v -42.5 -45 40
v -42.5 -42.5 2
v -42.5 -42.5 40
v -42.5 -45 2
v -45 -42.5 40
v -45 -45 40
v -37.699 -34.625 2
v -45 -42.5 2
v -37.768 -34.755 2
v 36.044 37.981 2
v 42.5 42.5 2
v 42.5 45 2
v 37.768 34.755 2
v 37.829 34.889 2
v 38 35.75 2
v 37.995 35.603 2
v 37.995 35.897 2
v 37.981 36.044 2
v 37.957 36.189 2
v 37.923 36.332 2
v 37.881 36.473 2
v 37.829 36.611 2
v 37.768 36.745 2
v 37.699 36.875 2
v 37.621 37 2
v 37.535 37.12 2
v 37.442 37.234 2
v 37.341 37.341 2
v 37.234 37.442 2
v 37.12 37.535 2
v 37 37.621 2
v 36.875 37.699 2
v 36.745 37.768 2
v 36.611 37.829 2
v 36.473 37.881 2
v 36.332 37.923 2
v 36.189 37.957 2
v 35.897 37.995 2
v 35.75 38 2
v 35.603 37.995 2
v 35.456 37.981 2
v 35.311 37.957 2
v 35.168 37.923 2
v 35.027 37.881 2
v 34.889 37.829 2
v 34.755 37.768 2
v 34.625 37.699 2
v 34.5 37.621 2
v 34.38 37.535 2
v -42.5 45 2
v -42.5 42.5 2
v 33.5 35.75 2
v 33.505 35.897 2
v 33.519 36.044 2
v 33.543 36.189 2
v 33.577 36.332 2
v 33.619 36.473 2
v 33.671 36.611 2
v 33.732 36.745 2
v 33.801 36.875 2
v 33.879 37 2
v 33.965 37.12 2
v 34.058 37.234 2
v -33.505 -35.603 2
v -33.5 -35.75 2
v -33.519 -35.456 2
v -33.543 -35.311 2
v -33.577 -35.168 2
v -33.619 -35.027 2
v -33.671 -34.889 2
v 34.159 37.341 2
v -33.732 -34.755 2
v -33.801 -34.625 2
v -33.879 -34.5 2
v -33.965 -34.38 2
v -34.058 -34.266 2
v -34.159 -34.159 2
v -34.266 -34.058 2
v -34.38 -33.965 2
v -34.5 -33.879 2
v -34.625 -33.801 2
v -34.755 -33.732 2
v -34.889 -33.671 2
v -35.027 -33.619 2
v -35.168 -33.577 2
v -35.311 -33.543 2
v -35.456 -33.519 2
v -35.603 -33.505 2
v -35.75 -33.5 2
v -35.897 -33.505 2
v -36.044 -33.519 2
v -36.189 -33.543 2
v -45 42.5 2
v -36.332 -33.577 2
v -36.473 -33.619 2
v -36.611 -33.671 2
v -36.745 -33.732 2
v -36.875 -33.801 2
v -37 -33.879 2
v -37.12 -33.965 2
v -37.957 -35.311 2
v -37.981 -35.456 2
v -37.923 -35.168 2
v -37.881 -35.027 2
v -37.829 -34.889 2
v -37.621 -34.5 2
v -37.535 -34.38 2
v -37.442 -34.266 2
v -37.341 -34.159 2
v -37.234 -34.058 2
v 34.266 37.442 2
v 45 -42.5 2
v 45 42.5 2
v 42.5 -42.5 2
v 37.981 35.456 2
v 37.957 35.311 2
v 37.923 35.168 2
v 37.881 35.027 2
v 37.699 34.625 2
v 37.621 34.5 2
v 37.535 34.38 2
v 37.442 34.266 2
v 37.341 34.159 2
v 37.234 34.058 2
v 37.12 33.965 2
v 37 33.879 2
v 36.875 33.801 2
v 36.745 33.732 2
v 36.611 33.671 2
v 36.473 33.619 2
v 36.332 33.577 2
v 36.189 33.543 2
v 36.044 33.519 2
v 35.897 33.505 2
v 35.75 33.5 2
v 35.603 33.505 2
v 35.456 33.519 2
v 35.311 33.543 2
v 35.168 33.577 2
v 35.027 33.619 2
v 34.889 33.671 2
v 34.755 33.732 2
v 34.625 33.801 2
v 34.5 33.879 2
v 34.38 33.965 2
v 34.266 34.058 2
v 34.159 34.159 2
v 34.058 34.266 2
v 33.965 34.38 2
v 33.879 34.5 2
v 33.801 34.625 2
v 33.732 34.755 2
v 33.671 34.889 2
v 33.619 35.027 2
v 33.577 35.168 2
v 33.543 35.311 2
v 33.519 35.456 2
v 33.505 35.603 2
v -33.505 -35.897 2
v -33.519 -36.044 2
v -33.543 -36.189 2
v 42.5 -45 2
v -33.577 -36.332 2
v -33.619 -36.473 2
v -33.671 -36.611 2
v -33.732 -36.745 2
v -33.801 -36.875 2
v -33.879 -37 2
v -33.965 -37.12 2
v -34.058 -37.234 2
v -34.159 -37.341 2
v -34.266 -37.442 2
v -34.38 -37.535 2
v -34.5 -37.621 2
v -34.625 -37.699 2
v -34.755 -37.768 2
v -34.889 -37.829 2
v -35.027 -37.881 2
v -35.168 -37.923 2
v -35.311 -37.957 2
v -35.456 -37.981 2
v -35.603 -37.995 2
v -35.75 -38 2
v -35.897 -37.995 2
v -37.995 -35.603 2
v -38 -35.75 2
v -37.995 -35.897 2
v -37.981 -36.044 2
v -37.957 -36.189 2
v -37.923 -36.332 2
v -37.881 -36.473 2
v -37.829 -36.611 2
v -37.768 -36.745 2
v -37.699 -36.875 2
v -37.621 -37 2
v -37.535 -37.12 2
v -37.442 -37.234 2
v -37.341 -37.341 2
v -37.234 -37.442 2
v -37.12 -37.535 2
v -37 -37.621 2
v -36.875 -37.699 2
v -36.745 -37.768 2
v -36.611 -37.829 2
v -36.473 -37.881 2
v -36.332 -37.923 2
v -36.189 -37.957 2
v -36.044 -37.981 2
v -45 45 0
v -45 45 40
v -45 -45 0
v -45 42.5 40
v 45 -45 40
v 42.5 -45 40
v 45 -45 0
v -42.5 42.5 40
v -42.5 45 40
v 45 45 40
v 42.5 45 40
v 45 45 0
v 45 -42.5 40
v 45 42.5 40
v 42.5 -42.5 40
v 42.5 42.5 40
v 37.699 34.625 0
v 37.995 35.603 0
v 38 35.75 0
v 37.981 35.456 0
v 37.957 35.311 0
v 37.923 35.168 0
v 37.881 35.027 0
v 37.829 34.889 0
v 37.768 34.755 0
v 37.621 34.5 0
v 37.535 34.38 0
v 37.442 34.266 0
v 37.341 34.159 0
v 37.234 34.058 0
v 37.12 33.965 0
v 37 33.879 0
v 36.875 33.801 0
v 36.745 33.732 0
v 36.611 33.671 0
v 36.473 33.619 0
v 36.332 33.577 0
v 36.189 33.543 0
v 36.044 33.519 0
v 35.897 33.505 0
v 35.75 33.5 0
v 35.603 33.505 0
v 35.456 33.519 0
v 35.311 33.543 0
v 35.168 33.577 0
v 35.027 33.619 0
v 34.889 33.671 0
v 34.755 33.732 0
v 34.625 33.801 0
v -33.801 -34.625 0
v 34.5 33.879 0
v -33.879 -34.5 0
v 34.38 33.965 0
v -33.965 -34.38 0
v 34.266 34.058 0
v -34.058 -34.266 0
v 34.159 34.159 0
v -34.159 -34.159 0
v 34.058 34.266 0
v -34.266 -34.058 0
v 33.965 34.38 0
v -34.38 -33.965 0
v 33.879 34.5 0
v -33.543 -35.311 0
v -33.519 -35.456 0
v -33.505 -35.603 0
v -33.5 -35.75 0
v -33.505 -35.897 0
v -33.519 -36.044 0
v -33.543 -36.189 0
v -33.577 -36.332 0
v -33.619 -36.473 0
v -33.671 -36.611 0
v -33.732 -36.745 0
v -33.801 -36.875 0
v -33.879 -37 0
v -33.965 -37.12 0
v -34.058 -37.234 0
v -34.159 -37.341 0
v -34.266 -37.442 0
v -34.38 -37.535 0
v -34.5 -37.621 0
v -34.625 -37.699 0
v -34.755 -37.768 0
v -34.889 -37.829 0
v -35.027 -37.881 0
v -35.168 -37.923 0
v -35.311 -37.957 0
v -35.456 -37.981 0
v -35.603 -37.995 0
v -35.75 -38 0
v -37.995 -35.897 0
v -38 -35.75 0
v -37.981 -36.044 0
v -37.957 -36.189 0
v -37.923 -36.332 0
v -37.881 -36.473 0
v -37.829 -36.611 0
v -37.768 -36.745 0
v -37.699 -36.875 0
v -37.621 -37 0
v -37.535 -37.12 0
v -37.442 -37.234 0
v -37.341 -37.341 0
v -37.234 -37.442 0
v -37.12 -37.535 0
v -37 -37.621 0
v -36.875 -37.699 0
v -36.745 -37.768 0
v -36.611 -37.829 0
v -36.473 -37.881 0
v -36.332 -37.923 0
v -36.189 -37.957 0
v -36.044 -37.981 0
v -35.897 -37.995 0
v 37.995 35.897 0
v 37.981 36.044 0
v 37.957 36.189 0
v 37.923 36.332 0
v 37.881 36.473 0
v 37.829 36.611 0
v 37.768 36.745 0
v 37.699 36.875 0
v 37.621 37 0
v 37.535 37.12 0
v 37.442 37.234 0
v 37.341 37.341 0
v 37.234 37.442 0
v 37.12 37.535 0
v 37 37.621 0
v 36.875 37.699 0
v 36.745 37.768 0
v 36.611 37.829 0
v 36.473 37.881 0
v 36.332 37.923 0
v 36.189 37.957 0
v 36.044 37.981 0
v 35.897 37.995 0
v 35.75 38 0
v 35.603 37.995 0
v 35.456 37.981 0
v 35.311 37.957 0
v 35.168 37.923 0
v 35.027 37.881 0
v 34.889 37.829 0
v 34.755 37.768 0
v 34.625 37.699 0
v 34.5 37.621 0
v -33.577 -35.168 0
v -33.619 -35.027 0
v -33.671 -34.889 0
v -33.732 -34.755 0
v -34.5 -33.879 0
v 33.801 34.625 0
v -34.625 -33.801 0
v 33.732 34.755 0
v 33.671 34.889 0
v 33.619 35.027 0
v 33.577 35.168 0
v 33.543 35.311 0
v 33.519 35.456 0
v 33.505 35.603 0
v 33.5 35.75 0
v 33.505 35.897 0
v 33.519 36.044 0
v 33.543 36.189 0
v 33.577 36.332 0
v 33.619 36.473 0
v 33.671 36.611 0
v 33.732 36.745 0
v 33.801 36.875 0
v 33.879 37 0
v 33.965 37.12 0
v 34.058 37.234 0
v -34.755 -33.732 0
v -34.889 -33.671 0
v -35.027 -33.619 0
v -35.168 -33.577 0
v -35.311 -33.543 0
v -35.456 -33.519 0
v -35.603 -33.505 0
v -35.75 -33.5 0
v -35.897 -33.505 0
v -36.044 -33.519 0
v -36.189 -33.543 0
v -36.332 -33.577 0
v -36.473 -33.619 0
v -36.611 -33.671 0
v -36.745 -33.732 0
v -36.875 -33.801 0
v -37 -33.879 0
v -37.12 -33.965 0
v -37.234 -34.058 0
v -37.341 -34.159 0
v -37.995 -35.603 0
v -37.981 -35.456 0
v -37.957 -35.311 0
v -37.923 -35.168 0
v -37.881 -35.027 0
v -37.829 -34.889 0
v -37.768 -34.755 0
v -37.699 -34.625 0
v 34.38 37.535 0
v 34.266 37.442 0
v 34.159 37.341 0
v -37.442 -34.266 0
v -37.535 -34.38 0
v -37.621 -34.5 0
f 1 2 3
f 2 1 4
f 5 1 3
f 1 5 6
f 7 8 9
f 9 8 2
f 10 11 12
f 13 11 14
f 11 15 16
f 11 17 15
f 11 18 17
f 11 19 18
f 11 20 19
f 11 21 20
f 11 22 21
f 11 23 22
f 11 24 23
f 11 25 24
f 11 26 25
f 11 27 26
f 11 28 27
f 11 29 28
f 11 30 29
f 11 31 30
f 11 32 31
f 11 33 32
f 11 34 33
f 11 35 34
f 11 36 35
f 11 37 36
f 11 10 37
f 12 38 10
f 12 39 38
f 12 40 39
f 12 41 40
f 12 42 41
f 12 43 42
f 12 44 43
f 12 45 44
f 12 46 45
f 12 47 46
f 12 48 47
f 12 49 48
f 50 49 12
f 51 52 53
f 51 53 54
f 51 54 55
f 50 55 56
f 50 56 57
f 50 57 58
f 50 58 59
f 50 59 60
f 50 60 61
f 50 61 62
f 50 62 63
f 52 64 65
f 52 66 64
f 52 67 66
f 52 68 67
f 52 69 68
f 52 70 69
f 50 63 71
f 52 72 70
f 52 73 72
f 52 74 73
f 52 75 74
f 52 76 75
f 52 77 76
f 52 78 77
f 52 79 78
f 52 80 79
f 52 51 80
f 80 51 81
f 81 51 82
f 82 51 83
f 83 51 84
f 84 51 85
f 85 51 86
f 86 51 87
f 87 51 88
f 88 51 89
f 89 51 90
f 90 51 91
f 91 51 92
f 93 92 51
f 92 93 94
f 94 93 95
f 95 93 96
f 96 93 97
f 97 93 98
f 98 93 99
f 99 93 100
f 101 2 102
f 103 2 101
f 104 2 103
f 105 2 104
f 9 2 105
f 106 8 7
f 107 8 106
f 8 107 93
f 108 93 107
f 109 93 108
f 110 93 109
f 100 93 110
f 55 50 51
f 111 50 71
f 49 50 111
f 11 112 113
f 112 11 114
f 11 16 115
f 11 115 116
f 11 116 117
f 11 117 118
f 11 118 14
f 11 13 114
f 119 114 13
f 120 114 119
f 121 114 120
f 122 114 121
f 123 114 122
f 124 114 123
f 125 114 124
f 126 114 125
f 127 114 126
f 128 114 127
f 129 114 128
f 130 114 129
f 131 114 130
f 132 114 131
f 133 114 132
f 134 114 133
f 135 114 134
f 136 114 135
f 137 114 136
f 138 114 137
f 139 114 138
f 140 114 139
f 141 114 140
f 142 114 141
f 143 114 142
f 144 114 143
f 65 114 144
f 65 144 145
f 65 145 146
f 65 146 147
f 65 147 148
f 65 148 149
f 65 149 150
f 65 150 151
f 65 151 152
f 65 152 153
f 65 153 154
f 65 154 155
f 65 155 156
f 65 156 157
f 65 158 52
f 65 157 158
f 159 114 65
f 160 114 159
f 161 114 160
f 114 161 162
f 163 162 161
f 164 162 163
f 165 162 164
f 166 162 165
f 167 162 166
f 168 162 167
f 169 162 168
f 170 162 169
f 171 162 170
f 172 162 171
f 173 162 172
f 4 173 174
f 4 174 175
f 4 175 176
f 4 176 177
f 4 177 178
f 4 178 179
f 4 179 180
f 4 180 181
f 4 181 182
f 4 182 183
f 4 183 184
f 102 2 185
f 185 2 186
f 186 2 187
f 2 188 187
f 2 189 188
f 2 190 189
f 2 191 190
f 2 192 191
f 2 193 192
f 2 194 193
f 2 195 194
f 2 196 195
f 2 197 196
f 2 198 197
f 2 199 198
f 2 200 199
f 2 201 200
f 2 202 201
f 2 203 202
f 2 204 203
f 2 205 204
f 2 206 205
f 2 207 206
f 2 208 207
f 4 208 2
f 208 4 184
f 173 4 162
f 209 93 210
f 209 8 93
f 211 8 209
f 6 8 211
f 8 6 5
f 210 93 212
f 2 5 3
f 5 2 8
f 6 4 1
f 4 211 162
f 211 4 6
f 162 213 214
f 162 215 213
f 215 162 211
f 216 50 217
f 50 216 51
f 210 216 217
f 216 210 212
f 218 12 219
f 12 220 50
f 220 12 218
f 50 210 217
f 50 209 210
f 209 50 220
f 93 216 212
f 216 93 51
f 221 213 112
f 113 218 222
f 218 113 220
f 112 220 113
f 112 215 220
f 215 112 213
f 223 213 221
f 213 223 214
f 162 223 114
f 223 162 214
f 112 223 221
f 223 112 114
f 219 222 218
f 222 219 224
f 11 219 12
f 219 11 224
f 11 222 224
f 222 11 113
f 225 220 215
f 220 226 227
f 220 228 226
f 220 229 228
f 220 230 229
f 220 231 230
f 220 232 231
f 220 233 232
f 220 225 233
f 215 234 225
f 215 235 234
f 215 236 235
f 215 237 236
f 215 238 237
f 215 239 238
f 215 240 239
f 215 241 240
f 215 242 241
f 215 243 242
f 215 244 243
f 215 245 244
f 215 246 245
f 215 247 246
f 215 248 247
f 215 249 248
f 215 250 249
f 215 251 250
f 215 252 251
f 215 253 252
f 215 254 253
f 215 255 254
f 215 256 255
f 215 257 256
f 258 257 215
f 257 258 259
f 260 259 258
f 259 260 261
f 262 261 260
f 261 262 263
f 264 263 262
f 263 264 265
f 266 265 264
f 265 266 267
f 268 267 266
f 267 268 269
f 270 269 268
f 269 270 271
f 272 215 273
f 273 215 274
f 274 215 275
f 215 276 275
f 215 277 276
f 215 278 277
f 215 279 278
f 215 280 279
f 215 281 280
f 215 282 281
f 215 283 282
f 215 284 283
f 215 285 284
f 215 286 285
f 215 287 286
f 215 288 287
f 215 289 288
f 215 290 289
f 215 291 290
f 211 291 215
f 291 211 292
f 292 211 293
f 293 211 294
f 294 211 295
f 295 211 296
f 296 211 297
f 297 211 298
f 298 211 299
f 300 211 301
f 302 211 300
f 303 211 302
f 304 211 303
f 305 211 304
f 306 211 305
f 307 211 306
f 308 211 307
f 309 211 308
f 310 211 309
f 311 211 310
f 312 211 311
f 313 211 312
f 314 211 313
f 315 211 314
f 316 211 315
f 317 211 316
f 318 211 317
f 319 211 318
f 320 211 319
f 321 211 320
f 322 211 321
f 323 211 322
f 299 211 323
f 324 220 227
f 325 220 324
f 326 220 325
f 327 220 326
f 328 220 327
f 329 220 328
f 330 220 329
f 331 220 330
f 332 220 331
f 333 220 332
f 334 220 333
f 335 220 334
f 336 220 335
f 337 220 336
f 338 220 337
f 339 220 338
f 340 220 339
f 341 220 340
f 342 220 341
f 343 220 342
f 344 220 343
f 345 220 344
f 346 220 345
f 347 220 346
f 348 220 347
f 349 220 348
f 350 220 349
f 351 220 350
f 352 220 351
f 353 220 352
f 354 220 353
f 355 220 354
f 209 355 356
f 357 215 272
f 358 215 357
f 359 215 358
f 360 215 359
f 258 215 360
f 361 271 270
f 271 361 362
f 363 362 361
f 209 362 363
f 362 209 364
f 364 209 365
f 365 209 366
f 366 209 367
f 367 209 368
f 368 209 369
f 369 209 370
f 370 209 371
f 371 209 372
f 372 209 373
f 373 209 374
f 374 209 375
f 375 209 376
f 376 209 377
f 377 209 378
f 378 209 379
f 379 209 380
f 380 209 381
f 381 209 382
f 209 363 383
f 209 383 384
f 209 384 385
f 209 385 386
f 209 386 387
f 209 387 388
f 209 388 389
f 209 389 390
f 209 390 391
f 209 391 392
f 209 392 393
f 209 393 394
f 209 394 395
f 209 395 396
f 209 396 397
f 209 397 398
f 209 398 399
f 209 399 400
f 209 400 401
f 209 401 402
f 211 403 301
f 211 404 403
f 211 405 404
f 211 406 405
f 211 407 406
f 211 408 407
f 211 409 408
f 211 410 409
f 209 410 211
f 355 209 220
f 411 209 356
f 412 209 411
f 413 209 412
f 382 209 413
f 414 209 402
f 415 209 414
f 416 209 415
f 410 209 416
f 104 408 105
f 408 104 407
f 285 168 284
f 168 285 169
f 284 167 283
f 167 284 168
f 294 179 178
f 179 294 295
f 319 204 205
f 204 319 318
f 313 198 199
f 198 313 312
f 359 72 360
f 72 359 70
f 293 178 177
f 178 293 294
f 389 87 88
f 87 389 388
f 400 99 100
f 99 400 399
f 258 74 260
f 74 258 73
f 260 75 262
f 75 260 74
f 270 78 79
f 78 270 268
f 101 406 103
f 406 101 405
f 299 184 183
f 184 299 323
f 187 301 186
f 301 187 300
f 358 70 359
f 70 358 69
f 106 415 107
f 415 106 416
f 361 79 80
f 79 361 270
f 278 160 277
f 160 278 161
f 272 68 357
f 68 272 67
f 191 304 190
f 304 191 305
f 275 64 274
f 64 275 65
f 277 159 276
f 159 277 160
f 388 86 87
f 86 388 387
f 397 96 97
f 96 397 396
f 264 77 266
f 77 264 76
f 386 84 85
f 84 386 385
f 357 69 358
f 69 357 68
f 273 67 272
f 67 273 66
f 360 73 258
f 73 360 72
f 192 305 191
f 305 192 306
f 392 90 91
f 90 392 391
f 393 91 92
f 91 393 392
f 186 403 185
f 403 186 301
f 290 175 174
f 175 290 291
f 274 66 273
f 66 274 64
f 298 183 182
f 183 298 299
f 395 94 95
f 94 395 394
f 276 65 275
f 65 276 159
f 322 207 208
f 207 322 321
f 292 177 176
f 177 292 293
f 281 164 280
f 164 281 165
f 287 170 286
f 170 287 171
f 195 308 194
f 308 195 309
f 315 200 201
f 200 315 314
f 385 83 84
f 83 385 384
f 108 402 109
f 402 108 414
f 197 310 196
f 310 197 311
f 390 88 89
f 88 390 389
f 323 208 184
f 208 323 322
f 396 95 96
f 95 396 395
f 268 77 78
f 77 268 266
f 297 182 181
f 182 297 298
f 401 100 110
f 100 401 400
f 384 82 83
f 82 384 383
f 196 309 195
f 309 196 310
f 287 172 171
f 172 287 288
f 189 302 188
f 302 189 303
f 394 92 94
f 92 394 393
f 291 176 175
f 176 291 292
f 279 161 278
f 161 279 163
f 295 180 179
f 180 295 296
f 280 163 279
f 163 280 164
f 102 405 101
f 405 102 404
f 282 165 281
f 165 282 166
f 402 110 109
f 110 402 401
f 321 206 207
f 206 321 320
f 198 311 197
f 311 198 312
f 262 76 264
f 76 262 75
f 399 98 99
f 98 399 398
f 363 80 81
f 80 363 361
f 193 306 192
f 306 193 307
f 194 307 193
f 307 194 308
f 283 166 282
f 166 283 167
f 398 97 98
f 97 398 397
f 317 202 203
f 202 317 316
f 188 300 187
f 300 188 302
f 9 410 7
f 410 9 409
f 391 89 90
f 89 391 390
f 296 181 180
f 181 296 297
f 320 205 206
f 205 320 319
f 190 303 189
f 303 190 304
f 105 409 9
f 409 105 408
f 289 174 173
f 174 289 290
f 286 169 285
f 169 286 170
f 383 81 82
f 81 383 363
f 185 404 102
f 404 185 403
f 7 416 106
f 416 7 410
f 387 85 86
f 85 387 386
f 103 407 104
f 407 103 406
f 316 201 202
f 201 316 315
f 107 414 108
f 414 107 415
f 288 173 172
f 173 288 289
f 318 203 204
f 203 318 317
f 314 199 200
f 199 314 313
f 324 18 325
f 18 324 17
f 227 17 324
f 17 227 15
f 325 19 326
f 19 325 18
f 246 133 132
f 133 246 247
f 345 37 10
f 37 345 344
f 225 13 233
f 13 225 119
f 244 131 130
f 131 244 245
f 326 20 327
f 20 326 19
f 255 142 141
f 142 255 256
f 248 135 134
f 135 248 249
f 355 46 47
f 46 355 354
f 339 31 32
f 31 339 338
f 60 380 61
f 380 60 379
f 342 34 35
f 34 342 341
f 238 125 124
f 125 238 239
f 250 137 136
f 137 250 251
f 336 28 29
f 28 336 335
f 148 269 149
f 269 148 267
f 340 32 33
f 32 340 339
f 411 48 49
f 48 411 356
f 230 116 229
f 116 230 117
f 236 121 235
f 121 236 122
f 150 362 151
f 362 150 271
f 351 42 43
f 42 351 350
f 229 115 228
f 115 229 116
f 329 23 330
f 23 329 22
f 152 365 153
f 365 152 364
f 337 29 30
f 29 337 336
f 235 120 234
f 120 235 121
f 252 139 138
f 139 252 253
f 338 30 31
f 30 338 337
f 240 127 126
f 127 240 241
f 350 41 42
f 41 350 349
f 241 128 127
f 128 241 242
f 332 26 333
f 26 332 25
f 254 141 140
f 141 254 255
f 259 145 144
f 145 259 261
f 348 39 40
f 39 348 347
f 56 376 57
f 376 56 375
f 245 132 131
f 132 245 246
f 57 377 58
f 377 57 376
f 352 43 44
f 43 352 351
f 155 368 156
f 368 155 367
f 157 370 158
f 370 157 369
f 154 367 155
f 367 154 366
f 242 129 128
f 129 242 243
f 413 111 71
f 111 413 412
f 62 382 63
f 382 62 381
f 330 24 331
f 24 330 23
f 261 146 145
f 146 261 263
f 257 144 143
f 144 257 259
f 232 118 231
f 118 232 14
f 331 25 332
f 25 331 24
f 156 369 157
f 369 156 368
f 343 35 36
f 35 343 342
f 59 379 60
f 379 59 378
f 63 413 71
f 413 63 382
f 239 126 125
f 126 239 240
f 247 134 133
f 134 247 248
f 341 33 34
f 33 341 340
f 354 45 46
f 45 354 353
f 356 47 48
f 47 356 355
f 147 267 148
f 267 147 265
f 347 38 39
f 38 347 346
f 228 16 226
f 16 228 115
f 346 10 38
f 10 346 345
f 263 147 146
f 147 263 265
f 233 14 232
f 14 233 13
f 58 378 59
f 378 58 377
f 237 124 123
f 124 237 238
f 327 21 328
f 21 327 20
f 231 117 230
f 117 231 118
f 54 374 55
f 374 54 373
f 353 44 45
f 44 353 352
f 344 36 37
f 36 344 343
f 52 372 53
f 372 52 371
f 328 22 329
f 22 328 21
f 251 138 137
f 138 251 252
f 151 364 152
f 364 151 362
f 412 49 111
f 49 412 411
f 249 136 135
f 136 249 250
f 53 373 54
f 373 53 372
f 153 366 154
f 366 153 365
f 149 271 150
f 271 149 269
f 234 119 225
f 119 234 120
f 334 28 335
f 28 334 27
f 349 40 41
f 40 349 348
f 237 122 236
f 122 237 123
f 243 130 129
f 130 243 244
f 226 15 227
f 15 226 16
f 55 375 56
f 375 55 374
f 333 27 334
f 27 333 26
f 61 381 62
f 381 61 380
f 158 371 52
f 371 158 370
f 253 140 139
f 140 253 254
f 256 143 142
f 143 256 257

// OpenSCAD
// Magnetic stirrer housing for 80 mm PC case fan
// Print orientation: top plate on bed (z = 0), walls rise to z = 40

// ---------- Parameters ----------
top_thickness      = 2;     // top plate thickness
wall_thickness     = 2.5;   // wall thickness
open_height        = 38;    // height of open box (z = wall_top - wall_thickness)
outer_size         = 90;    // outer X and Y size of box
hole_count         = 4;     // number of mounting holes
hole_size          = 4.5;   // mounting hole diameter
hole_pitch         = 71.5;  // square pitch of mounting holes
notch_width        = 12;    // cable notch width
notch_depth        = 8;     // notch depth from open edge
eps                = 0.5;   // cutter overshoot past faces

$fn = 96;

// ---------- Derived ----------
wall_top_z = top_thickness + wall_thickness + open_height;  // z = 40
notch_start_z = wall_top_z - notch_depth;                   // z = 32

// ---------- Model ----------
difference() {
    // Main body: top plate + four walls, open at top
    union() {
        // Top plate
        translate([-outer_size/2, -outer_size/2, 0])
            cube([outer_size, outer_size, top_thickness]);

        // Walls
        for (sx = [-1, 1], sy = [-1, 1]) {
            x0 = sx < 0 ? -outer_size/2 : outer_size/2 - wall_thickness;
            x1 = sx < 0 ? -outer_size/2 + wall_thickness : outer_size/2;
            y0 = sy < 0 ? -outer_size/2 : outer_size/2 - wall_thickness;
            y1 = sy < 0 ? -outer_size/2 + wall_thickness : outer_size/2;
            translate([x0, y0, top_thickness])
                cube([wall_thickness, wall_thickness, open_height]);
        }
    }

    // Screw holes through top plate
    for (i = [0 : hole_count - 1]) {
        a = (i - (hole_count - 1)/2) * hole_pitch;
        translate([a, a, -eps])
            cylinder(d = hole_size, h = top_thickness + 2*eps);
    }

    // Cable notch in one wall (along +X wall, centred along Y)
    translate([outer_size/2 - wall_thickness, -notch_width/2, notch_start_z])
        cube([wall_thickness + eps, notch_width, notch_depth + eps]);
}
